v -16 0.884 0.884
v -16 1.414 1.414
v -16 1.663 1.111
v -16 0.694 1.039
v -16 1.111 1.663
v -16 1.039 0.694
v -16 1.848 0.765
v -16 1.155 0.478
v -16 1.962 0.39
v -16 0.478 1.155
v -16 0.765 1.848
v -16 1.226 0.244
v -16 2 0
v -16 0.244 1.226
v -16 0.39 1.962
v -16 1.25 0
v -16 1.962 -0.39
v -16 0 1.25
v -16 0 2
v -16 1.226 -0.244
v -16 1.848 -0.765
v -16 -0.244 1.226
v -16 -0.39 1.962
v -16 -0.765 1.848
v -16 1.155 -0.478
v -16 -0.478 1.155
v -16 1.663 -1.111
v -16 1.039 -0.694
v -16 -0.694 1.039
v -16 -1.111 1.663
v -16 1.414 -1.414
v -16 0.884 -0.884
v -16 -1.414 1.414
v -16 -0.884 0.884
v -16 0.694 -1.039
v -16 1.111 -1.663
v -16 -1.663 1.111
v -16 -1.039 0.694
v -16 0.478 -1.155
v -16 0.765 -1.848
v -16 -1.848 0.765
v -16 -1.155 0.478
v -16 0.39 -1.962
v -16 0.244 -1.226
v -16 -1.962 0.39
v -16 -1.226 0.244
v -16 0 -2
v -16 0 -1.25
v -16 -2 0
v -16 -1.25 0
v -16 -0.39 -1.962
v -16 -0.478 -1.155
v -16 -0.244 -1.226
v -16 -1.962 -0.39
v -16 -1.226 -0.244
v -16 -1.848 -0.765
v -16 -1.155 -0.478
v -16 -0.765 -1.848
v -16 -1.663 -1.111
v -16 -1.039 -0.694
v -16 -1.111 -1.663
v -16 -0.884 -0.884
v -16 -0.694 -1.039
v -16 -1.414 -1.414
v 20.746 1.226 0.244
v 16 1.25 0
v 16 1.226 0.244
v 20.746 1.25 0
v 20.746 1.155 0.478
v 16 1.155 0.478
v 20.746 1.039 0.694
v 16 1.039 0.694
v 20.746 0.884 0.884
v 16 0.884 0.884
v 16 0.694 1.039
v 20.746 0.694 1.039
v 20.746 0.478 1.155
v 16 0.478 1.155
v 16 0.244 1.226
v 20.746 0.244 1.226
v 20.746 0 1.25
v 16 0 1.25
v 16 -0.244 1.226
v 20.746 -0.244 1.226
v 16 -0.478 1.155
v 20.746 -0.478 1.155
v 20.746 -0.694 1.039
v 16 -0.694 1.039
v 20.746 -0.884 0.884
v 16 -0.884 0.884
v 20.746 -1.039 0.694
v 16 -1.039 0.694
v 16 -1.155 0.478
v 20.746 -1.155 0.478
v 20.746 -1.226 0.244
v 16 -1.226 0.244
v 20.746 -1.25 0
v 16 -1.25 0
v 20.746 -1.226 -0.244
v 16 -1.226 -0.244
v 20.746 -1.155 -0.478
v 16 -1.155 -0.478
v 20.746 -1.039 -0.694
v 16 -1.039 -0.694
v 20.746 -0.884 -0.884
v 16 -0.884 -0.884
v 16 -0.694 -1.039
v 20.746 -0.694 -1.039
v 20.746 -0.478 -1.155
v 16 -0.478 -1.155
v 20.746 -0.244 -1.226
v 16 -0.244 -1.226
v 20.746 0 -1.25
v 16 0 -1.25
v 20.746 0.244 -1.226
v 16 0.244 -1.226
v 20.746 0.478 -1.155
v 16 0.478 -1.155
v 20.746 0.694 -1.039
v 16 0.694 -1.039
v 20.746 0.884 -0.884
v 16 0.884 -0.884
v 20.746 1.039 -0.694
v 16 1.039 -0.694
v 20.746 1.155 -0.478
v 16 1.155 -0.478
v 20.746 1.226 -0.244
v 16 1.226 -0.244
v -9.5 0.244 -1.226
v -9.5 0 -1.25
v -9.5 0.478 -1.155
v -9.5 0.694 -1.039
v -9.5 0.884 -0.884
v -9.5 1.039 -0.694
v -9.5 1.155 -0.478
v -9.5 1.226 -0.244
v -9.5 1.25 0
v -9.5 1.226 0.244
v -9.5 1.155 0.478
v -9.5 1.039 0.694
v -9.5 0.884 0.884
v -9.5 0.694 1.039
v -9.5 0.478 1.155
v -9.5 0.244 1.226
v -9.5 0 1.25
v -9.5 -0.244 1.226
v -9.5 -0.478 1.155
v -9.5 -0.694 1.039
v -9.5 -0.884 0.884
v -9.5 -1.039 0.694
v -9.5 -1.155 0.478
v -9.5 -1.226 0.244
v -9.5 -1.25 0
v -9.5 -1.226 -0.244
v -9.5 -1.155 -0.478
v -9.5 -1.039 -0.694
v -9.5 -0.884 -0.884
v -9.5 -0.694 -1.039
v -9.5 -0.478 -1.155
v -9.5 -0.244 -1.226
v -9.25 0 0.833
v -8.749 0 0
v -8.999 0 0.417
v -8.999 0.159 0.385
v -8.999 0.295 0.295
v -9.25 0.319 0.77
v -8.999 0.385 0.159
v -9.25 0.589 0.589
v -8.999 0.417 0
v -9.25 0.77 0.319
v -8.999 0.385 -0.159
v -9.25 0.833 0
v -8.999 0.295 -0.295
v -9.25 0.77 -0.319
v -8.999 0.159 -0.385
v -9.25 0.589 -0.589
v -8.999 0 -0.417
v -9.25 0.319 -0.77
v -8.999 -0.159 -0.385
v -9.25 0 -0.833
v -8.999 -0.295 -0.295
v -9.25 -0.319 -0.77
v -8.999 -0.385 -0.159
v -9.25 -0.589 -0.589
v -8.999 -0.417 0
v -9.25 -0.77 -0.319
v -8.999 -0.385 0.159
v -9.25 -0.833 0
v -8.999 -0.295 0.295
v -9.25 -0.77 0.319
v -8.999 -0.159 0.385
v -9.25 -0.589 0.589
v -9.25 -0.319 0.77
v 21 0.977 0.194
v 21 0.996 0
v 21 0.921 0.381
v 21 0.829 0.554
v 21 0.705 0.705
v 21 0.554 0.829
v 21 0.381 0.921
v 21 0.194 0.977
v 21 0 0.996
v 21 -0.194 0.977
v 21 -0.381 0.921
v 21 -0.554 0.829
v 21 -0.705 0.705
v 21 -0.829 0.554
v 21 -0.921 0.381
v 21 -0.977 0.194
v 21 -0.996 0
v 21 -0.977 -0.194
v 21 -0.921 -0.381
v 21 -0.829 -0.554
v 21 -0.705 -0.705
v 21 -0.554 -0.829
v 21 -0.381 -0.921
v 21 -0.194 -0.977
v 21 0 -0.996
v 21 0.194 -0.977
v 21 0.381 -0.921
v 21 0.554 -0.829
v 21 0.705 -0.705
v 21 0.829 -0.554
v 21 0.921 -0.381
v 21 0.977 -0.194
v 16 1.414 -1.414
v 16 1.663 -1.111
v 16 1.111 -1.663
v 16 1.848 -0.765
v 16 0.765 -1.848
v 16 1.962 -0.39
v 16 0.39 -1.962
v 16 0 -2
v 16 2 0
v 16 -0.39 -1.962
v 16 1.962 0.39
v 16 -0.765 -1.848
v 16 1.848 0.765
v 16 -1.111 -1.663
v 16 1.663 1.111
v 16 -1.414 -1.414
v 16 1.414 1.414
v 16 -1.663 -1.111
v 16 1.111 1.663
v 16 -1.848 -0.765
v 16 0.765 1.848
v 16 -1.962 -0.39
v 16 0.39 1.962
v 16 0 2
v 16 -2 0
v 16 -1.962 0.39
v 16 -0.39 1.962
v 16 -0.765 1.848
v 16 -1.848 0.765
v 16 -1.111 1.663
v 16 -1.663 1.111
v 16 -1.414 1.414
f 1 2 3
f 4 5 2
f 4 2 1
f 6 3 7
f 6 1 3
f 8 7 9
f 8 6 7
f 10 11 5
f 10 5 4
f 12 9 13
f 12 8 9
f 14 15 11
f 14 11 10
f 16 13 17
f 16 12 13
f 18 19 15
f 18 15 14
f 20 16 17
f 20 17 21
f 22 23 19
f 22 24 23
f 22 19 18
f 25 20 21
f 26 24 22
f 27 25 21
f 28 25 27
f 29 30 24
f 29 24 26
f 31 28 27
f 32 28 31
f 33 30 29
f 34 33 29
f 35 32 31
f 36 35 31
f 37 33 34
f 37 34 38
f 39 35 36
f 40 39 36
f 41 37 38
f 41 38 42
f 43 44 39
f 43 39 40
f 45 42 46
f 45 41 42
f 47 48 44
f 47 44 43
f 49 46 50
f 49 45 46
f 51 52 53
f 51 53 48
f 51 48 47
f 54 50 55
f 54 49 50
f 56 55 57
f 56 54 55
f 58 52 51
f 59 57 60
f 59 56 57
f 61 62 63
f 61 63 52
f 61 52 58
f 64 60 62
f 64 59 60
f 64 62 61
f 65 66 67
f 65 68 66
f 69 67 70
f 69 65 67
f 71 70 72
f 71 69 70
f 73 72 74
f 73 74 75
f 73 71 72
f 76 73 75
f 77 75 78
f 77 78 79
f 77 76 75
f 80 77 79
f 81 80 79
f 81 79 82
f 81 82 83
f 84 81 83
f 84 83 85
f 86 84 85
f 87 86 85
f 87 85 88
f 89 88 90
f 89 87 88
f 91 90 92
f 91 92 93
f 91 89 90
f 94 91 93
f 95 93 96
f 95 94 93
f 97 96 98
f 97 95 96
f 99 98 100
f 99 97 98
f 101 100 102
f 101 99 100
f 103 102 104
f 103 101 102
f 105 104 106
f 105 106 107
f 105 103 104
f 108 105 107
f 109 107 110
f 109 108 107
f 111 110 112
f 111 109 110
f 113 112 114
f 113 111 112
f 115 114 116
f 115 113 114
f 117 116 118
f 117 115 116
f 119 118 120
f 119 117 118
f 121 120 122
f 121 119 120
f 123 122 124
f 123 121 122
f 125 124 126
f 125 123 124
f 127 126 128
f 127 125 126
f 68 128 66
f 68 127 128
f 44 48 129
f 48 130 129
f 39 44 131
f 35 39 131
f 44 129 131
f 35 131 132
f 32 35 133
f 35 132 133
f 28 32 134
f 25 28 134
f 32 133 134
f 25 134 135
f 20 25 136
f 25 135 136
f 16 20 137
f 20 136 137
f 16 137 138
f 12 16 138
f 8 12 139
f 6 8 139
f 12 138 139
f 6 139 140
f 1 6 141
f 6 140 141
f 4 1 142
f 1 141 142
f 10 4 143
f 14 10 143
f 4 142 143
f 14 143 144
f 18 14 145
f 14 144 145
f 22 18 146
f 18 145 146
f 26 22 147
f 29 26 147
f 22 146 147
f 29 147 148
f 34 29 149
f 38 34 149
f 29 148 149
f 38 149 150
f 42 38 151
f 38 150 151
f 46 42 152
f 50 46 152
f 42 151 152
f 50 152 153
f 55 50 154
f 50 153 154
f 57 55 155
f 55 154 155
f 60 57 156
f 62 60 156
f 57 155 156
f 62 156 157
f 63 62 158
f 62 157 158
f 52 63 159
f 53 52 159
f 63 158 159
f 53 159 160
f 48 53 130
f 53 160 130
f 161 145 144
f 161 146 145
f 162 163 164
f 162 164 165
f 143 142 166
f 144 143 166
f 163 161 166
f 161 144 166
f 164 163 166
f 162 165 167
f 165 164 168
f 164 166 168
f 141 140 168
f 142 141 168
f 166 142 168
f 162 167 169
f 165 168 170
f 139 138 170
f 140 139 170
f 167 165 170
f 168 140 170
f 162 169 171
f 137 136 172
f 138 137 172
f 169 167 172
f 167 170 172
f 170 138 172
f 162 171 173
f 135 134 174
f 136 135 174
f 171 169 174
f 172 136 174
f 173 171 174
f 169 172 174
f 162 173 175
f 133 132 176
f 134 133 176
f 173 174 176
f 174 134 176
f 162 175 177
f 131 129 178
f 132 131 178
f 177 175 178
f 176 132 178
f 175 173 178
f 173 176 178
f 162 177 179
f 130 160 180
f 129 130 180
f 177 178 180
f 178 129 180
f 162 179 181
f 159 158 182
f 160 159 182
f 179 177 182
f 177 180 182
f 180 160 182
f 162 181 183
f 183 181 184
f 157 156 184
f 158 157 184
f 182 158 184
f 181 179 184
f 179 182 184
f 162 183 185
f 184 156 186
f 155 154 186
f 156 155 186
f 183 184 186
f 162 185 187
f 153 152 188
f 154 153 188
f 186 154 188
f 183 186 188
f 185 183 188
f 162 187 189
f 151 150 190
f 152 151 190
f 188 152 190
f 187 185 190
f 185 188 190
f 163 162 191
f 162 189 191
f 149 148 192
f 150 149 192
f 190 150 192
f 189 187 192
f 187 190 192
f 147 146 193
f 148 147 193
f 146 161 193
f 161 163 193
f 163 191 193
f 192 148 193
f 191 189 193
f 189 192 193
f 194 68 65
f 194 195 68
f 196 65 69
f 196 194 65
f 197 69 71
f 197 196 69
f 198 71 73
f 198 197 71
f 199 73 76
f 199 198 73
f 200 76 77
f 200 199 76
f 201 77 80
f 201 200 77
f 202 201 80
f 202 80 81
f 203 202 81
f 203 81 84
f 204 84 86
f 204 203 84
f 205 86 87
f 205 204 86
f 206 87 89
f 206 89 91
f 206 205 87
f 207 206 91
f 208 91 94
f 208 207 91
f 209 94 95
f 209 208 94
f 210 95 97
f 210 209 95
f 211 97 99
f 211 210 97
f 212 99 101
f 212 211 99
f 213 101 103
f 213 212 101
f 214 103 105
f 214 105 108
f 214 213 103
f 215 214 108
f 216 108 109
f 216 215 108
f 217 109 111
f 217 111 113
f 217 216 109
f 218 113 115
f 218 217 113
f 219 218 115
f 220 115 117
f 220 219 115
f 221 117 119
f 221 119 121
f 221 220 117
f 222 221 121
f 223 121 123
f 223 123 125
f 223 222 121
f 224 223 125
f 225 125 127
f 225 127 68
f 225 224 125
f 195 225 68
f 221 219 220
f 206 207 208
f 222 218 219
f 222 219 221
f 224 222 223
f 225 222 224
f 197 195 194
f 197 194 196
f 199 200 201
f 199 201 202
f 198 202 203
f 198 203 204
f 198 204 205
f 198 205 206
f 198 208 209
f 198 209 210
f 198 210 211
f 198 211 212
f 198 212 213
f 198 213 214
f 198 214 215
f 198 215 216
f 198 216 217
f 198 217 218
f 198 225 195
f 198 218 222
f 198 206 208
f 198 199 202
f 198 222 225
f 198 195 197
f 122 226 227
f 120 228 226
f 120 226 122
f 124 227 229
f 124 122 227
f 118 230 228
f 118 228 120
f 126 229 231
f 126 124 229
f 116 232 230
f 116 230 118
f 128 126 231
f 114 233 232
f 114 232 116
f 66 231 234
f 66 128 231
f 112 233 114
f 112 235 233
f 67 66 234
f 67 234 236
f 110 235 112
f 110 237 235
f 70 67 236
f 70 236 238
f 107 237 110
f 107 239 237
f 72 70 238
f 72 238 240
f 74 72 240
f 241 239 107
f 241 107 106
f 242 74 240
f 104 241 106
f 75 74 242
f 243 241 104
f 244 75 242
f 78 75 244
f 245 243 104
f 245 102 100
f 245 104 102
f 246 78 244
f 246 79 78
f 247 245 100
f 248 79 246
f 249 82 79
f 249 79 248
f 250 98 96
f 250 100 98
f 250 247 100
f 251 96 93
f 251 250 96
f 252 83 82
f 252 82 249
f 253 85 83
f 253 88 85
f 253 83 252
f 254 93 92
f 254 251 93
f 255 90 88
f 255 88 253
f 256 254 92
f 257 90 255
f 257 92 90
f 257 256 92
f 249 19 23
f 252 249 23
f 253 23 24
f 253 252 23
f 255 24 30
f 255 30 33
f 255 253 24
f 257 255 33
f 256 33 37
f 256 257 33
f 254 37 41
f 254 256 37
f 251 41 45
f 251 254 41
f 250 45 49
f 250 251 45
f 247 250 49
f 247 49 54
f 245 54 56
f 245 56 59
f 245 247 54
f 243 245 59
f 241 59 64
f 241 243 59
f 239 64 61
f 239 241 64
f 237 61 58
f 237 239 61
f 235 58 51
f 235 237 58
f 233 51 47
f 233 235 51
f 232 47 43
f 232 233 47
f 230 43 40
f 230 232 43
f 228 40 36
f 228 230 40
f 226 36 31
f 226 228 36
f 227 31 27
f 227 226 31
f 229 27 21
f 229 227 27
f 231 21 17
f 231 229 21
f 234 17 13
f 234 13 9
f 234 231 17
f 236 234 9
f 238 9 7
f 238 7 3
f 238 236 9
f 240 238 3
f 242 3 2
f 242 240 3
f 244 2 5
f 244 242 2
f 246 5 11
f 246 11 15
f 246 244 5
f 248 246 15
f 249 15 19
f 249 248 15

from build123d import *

# Parameters (mm, degrees)
M3_GEWINDEBOHRUNG1_D     = 2.5
M3_GEWINDEBOHRUNG1_DEPTH = 6.5
M3_GEWINDEBOHRUNG1_TIP   = 0.751075774
FASE1_SIZE               = 0.2
SKETCH2_R                = 1.25
CUT_EXTRUDE1_DEPTH       = 3


# Read off the part's stored shape, not the designer's step: M2.5 Machine Threads Stud1
with BuildPart() as part:
    # Skizze1 → Rotation1 (revolve)
    with BuildSketch(Plane.XY, mode=Mode.PRIVATE) as rotation1_sk:
        Polygon((19, 0), (-16, 0), (-16, 2), (16, 2), (16, 1.25), (19, 1.25), align=None)
    revolve(rotation1_sk.sketch.rotate(Axis((0, 0, 0), (1, 0, 0)), 90), axis=Axis((0, 0, 0), (1, 0, 0)))

    # M3 Gewindebohrung1
    with Locations(Plane.ZY.offset(16)):
        with Locations((0, 0)):
            Hole(M3_GEWINDEBOHRUNG1_D / 2, depth=M3_GEWINDEBOHRUNG1_DEPTH)
            with Locations((0, 0, -(M3_GEWINDEBOHRUNG1_DEPTH + M3_GEWINDEBOHRUNG1_TIP / 2))):  # 118° drill point
                Cone(0, M3_GEWINDEBOHRUNG1_D / 2, M3_GEWINDEBOHRUNG1_TIP, mode=Mode.SUBTRACT)

    # Fase1
    fase1_edges = [part.edges().sort_by_distance(p)[0] for p in [
        (19, 0, -1.25),
    ]]
    chamfer(fase1_edges, length=FASE1_SIZE)

    # Sketch2 → Cut-Extrude1 (cut)
    with BuildSketch(Plane(origin=(19, 0, 0), x_dir=(0, 0, -1), z_dir=(1, 0, 0))):
        with Locations(Location((0, 0, 0), (0, 0, 180))):
            Circle(SKETCH2_R)
    extrude(amount=-CUT_EXTRUDE1_DEPTH, mode=Mode.SUBTRACT)

    # M2.5 Machine Threads Stud1 outline → M2.5 Machine Threads Stud1 (revolve)
    with BuildSketch(Plane.YX):
        Polygon((0.9965, 21), (0, 21), (0, 16), (1.25, 16), (1.25, 20.7465), align=None)
    revolve(axis=Axis((0, 0, 0), (1, 0, 0)))


solid = part.part
